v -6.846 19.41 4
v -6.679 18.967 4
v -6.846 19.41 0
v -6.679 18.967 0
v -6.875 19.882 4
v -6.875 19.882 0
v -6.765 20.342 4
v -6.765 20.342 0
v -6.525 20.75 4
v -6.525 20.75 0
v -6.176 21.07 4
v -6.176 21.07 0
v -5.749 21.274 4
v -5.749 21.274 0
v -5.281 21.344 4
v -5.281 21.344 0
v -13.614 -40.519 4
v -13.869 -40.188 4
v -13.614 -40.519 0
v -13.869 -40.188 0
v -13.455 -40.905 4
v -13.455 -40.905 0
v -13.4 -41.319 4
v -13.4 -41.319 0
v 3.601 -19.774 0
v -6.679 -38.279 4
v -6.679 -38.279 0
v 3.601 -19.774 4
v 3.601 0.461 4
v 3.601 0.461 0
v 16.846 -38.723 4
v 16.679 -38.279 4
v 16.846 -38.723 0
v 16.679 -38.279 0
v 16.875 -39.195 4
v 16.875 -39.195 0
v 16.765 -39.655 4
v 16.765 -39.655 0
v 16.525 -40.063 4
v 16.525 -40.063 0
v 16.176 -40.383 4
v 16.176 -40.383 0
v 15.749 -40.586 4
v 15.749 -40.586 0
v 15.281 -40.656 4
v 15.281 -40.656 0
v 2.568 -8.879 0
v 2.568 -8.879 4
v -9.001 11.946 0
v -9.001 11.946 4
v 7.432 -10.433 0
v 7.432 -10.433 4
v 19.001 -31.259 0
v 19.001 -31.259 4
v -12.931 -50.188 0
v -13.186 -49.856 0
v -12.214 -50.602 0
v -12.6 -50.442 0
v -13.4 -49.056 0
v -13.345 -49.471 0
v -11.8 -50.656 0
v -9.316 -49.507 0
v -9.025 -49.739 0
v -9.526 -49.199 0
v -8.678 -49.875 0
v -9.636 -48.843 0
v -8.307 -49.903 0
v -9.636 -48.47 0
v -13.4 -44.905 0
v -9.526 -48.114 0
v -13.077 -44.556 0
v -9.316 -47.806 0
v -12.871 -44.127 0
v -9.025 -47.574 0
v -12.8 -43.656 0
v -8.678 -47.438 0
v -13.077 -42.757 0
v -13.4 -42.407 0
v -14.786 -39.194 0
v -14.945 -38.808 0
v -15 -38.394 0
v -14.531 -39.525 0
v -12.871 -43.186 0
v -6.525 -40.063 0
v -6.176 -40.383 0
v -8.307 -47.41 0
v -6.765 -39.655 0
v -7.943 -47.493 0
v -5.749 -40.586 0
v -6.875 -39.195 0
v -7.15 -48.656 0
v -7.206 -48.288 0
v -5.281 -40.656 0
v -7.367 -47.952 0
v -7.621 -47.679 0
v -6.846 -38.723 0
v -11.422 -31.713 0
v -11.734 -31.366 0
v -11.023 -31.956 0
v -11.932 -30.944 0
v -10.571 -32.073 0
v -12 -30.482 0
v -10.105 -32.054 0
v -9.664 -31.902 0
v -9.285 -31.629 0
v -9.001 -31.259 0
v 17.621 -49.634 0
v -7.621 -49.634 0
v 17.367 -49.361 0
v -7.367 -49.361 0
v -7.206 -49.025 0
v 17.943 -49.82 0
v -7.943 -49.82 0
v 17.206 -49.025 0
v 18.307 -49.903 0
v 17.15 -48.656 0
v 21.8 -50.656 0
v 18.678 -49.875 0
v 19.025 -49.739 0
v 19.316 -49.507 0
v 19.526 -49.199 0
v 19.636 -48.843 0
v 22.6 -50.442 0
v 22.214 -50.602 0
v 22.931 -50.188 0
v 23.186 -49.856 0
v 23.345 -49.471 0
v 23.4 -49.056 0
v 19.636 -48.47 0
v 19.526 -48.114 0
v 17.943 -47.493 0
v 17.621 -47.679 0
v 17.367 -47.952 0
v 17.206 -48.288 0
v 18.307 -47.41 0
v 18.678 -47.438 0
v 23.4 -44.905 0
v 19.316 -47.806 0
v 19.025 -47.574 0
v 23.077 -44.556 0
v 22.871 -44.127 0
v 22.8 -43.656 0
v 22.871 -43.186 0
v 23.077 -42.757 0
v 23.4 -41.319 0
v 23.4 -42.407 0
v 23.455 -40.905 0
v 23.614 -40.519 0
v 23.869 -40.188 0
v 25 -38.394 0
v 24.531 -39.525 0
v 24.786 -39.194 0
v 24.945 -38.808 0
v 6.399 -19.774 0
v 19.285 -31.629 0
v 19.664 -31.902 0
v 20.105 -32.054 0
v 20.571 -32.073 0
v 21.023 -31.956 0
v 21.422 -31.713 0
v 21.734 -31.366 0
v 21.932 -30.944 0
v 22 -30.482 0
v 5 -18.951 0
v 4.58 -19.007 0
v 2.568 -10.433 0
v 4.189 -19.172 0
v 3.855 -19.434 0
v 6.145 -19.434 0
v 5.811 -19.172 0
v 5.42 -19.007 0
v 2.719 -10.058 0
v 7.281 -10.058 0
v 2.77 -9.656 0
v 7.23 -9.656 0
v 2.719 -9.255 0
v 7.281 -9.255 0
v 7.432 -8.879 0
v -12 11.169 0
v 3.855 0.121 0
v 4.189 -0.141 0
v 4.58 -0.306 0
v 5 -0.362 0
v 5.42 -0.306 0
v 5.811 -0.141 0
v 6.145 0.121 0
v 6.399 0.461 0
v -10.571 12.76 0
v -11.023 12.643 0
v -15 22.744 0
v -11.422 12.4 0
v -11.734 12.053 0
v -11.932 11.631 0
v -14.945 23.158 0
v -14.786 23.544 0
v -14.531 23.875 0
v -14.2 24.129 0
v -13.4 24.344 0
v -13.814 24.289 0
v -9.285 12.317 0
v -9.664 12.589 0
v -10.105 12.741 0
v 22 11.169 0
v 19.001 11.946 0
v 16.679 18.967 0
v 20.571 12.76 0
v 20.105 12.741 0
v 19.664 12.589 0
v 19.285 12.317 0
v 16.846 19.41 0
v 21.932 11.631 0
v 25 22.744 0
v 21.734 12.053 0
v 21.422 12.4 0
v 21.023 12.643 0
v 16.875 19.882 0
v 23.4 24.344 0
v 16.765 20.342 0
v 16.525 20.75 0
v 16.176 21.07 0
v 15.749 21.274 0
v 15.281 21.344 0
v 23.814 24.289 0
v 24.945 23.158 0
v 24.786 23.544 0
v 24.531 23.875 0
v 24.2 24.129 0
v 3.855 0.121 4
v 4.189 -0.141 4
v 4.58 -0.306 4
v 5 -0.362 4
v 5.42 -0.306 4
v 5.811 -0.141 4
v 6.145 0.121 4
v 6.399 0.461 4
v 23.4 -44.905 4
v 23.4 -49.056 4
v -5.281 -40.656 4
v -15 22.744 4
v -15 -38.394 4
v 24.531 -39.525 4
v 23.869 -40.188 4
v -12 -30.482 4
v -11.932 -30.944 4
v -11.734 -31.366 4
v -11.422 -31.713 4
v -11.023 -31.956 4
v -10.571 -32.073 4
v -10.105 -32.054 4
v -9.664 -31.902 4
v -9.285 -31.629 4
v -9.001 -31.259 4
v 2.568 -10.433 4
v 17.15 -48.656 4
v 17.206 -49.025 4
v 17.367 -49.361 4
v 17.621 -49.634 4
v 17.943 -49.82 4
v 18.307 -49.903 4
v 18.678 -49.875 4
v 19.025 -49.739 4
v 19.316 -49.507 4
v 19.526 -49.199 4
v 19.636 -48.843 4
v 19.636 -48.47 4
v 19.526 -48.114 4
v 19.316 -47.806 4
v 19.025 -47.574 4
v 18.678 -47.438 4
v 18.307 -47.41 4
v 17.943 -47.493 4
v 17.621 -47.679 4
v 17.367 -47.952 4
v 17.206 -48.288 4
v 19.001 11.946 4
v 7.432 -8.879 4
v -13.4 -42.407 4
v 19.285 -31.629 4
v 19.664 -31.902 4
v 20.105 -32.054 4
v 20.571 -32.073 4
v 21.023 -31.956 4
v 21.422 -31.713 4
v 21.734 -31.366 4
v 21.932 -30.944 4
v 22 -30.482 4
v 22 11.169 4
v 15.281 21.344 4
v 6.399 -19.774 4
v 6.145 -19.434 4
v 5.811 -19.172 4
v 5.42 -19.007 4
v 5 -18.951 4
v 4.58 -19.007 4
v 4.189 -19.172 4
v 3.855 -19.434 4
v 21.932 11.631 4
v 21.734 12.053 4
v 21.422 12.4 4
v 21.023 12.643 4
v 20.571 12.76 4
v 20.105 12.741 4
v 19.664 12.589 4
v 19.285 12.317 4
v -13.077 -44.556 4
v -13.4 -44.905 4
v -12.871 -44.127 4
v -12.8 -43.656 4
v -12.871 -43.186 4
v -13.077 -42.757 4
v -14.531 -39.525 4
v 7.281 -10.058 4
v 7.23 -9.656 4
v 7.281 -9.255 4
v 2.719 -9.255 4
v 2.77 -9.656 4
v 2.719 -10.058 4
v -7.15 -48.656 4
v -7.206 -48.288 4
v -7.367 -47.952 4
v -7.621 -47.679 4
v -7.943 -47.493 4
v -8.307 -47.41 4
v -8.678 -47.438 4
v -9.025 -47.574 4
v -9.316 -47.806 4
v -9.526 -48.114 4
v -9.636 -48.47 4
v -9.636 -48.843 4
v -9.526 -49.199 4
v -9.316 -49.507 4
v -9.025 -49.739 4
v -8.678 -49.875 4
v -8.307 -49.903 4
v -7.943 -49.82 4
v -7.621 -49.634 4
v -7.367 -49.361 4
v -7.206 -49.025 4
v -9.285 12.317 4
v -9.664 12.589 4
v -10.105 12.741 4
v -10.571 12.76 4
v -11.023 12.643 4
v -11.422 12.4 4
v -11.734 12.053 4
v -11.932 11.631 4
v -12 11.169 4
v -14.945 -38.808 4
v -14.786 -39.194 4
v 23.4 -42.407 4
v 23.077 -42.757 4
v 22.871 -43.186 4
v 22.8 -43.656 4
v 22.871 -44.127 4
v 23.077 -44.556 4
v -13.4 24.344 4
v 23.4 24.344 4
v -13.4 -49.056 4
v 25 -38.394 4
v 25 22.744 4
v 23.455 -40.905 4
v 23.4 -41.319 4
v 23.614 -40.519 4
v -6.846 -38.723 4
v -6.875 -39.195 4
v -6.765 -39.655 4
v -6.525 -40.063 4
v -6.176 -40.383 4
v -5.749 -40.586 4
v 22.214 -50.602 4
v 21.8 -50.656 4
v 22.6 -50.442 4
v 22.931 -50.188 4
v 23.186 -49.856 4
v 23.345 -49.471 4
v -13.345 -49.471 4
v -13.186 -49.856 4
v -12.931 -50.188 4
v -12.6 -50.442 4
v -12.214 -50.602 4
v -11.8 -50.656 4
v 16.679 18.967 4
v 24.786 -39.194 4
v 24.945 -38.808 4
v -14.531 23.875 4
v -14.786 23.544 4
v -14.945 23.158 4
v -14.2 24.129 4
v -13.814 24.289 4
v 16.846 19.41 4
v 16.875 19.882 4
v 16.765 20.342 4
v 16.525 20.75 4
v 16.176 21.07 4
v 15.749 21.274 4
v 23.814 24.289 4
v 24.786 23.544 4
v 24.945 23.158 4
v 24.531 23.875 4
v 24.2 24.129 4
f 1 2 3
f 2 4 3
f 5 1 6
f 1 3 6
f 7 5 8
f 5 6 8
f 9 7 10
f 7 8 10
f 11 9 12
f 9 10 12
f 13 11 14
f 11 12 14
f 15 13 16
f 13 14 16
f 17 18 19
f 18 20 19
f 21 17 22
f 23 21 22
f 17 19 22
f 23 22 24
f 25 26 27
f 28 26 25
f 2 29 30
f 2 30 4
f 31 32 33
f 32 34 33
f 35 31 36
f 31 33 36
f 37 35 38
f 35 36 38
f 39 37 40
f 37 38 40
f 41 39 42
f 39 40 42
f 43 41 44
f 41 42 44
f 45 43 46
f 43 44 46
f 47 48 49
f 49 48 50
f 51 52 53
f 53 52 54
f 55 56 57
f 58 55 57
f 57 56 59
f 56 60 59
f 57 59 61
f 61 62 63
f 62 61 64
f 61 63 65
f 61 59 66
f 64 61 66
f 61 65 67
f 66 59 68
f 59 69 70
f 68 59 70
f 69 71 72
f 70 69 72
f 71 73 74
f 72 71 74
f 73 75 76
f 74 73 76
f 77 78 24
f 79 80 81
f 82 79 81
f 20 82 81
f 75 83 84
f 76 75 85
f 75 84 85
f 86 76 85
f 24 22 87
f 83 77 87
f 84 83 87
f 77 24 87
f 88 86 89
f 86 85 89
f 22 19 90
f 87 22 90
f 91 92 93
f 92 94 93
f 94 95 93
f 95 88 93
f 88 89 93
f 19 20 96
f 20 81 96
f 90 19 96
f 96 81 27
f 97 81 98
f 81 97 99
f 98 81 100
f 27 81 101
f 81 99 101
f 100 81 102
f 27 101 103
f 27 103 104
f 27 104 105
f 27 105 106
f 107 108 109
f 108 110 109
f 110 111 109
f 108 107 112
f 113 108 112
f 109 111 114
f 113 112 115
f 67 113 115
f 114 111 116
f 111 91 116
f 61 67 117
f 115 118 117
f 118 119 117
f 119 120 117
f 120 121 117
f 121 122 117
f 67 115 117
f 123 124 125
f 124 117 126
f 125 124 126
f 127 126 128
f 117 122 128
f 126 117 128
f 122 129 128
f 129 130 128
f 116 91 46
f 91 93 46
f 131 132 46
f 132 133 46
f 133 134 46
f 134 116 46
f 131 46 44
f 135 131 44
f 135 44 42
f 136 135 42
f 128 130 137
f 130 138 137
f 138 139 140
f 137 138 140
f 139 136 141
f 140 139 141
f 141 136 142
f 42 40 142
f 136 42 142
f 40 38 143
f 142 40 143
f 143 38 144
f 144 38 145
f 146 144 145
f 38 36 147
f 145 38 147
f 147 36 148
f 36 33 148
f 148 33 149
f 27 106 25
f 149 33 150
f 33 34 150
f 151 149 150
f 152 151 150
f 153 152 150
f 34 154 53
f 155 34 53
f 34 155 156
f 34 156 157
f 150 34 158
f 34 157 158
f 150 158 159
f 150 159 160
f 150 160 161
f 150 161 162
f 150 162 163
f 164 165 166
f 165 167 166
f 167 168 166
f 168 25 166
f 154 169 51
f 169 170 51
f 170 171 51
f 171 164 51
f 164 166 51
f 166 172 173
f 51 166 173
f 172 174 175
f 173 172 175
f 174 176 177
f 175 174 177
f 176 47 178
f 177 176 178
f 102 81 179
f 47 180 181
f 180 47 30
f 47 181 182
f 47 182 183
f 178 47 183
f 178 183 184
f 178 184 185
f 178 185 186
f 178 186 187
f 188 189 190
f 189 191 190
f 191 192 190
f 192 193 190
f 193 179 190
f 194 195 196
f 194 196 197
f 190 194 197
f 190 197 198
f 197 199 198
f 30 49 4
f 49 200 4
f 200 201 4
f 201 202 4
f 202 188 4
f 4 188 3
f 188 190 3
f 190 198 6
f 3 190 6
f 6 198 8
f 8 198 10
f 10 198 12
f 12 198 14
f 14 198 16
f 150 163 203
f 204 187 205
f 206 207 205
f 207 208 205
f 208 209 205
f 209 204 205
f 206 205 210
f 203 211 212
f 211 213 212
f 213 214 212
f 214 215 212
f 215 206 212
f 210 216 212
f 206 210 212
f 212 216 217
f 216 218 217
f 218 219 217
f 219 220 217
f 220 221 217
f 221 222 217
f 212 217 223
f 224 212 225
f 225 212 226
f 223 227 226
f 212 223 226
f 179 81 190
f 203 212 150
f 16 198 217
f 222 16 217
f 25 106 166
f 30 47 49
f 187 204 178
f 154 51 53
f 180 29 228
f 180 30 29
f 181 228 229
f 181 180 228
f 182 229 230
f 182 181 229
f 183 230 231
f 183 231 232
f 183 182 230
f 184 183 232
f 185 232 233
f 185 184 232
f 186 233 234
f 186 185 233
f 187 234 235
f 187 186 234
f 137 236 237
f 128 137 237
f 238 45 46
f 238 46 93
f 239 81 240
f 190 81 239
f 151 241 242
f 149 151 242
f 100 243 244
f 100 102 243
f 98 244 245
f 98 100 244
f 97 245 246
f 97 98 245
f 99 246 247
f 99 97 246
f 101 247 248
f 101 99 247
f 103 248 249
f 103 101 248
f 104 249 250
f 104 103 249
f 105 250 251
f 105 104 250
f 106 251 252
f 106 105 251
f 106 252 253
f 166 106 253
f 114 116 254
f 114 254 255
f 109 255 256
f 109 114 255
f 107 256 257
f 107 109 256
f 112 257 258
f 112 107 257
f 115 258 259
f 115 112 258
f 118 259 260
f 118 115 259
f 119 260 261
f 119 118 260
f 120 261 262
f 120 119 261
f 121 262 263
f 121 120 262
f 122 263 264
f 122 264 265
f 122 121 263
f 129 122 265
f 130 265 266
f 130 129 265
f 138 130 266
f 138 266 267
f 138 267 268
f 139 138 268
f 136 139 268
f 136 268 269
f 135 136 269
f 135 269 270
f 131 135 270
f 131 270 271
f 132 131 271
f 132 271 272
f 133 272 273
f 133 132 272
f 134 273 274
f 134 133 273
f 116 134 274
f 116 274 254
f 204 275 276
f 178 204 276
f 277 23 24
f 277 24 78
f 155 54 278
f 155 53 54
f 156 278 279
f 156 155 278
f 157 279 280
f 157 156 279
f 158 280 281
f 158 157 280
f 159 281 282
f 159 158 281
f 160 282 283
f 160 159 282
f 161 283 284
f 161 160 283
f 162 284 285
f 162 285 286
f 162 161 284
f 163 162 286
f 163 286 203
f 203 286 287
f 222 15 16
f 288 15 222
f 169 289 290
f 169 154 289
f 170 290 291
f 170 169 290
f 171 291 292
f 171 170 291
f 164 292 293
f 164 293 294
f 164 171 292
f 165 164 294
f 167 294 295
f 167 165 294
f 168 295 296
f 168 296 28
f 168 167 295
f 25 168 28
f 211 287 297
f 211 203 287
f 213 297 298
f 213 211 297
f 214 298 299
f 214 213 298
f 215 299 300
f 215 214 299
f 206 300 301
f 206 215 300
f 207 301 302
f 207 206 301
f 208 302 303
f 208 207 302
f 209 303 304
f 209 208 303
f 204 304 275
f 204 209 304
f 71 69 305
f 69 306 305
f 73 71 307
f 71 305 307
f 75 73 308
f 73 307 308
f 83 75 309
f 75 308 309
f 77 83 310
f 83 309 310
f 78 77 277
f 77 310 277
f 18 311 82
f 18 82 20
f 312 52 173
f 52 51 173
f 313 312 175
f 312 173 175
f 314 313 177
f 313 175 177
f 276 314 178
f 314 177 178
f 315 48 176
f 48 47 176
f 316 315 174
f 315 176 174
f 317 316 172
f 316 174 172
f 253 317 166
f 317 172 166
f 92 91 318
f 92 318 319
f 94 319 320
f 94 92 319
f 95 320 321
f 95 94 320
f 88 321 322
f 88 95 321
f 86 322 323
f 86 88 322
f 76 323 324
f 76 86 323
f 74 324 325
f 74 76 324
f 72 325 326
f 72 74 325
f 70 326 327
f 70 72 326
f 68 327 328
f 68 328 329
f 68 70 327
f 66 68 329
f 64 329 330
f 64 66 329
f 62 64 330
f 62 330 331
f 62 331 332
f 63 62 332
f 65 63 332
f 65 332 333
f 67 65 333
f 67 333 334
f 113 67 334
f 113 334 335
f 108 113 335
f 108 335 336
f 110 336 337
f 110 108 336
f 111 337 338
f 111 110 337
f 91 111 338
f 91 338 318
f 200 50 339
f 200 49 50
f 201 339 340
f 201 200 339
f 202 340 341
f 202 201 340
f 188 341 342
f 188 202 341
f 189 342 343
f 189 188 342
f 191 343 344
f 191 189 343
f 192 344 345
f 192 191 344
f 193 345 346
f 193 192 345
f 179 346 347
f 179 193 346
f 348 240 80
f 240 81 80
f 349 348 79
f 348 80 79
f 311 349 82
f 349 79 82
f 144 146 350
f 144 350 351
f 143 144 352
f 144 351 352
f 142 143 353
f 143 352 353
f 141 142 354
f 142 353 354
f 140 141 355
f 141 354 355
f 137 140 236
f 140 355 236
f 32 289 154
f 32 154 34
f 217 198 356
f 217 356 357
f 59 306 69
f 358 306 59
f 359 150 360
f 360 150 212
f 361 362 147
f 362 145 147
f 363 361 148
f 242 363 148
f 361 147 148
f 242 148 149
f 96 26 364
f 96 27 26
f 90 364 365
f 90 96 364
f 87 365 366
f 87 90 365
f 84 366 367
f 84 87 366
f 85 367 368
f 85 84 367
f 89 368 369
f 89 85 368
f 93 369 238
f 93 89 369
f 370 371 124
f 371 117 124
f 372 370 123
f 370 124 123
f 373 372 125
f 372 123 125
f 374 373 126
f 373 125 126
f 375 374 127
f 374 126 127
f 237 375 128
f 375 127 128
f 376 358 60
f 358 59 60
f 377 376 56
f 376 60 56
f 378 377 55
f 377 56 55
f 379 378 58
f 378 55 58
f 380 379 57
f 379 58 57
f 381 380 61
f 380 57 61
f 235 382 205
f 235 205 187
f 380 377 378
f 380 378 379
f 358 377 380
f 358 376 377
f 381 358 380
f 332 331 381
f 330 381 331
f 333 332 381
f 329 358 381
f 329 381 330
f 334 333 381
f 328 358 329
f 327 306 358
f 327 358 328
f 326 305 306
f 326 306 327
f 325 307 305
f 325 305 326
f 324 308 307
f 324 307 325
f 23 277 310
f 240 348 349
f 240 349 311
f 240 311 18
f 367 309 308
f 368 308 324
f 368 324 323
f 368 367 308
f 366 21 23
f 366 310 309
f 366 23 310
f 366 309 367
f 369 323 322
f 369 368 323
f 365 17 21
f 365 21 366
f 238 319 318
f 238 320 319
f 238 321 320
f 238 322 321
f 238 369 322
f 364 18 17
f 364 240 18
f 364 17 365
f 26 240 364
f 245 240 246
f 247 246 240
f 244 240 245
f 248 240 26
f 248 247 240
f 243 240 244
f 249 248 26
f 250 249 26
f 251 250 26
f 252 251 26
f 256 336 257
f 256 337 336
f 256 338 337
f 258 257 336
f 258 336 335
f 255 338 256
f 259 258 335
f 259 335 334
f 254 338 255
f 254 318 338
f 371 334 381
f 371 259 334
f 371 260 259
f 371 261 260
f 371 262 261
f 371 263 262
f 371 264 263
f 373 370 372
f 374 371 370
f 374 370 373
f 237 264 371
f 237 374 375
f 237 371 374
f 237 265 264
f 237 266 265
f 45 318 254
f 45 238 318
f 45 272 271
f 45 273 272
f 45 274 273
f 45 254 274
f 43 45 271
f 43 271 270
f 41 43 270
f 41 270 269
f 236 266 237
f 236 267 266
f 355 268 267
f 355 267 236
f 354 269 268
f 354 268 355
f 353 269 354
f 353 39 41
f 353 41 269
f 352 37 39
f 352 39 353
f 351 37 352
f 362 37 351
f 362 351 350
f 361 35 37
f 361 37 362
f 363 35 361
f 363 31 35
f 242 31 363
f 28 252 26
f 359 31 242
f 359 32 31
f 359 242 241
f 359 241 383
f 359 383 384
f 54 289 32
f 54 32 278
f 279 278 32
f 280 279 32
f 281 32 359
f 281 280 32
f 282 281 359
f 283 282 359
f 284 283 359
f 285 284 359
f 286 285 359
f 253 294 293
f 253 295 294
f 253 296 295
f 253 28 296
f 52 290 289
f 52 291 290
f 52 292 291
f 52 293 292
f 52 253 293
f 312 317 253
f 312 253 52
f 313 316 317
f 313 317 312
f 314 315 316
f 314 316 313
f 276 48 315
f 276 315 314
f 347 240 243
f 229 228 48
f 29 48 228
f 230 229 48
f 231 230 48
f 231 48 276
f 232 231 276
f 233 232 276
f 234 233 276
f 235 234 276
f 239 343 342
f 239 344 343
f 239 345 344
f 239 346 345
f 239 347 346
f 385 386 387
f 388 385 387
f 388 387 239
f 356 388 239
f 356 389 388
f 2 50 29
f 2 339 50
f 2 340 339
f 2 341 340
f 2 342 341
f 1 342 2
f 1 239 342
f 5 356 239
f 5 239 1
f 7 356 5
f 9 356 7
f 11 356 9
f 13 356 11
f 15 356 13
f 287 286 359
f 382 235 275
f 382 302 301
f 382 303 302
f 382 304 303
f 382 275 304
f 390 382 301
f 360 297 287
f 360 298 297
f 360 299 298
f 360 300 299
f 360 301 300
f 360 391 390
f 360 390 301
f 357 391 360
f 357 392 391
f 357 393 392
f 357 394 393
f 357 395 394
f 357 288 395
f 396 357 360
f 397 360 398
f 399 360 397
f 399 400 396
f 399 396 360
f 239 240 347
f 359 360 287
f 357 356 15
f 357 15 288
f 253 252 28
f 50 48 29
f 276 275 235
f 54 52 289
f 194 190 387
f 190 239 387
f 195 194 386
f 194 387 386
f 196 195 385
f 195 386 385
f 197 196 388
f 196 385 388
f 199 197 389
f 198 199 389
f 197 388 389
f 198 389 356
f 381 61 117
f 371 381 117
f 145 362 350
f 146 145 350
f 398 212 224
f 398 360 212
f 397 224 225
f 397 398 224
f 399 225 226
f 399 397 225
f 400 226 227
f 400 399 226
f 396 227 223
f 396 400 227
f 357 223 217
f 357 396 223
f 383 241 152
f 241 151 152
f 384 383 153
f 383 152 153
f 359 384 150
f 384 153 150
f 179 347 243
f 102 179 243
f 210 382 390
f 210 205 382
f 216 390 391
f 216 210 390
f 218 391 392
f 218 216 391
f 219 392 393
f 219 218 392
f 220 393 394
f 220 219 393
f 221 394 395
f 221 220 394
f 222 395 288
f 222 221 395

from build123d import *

# Parameters (mm, degrees)
CROQUIS1_W              = 40
CROQUIS1_H              = 75
CROQUIS1_R              = 1.25
SALIENTE_EXTRUIR1_DEPTH = 4
CORTAR_EXTRUIR1_DEPTH   = 4
CORTAR_EXTRUIR2_DEPTH   = 4
CROQUIS4_R              = 1.6
CORTAR_EXTRUIR3_DEPTH   = 4
REDONDEO2_R             = 1.6


with BuildPart() as part:
    # Croquis1 → Saliente-Extruir1 (new body)
    with BuildSketch(Plane.XY):
        with Locations((5, -13.156453444)):
            Rectangle(CROQUIS1_W, CROQUIS1_H)
        with Locations((-8.4, -48.656453444)):
            Circle(CROQUIS1_R, mode=Mode.SUBTRACT)
        with Locations(Location((18.4, -48.656453444, 0), (0, 0, 180))):
            Circle(CROQUIS1_R, mode=Mode.SUBTRACT)
    extrude(amount=SALIENTE_EXTRUIR1_DEPTH)

    # Croquis2 → Cortar-Extruir1 (cut)
    with BuildSketch(Plane.XY.offset(4)):
        Polygon((-12, -36.656453444), (3, -9.656453444), (-12, 17.343546556), align=None)
        Polygon((-8, -40.656453444), (5, -17.256453444), (18, -40.656453444), align=None)
        Polygon((18, 21.343546556), (5, -2.056453444), (-8, 21.343546556), align=None)
        Polygon((22, 17.343546556), (7, -9.656453444), (22, -36.656453444), align=None)
    extrude(amount=-CORTAR_EXTRUIR1_DEPTH, mode=Mode.SUBTRACT)

    # Croquis3 → Cortar-Extruir2 (cut)
    with BuildSketch(Plane.XY.offset(4)):
        Polygon((-13.4, -50.656453444), (-15, -50.656453444), (-15, -40.656453444), (-15, -39.056453444), (-13.4, -40.656453444), align=None)
        Polygon((25, -50.656453444), (25, -40.656453444), (25, -39.056453444), (23.4, -40.656453444), (23.4, -50.656453444), align=None)
    extrude(amount=-CORTAR_EXTRUIR2_DEPTH, mode=Mode.SUBTRACT)

    # Croquis4 → Cortar-Extruir3 (cut)
    with BuildSketch(Plane.XY.offset(4)):
        with Locations((-14.4, -43.656453444)):
            Circle(CROQUIS4_R)
        with Locations((24.4, -43.656453444)):
            Circle(CROQUIS4_R)
    extrude(amount=-CORTAR_EXTRUIR3_DEPTH, mode=Mode.SUBTRACT)

    # Redondeo2
    redondeo2_edges = [part.edges().sort_by_distance(p)[0] for p in [
        (18, -40.656453444, 2),
        (-8, -40.656453444, 2),
        (5, -17.256453444, 2),
        (-8, 21.343546556, 2),
        (18, 21.343546556, 2),
        (5, -2.056453444, 2),
        (22, 17.343546556, 2),
        (22, -36.656453444, 2),
        (7, -9.656453444, 2),
        (-12, -36.656453444, 2),
        (-12, 17.343546556, 2),
        (3, -9.656453444, 2),
        (-15, 24.343546556, 2),
        (25, 24.343546556, 2),
        (-13.4, -40.656453444, 2),
        (-13.4, -50.656453444, 2),
        (-15, -39.056453444, 2),
        (23.4, -50.656453444, 2),
        (23.4, -40.656453444, 2),
        (25, -39.056453444, 2),
    ]]
    fillet(redondeo2_edges, radius=REDONDEO2_R)


solid = part.part
